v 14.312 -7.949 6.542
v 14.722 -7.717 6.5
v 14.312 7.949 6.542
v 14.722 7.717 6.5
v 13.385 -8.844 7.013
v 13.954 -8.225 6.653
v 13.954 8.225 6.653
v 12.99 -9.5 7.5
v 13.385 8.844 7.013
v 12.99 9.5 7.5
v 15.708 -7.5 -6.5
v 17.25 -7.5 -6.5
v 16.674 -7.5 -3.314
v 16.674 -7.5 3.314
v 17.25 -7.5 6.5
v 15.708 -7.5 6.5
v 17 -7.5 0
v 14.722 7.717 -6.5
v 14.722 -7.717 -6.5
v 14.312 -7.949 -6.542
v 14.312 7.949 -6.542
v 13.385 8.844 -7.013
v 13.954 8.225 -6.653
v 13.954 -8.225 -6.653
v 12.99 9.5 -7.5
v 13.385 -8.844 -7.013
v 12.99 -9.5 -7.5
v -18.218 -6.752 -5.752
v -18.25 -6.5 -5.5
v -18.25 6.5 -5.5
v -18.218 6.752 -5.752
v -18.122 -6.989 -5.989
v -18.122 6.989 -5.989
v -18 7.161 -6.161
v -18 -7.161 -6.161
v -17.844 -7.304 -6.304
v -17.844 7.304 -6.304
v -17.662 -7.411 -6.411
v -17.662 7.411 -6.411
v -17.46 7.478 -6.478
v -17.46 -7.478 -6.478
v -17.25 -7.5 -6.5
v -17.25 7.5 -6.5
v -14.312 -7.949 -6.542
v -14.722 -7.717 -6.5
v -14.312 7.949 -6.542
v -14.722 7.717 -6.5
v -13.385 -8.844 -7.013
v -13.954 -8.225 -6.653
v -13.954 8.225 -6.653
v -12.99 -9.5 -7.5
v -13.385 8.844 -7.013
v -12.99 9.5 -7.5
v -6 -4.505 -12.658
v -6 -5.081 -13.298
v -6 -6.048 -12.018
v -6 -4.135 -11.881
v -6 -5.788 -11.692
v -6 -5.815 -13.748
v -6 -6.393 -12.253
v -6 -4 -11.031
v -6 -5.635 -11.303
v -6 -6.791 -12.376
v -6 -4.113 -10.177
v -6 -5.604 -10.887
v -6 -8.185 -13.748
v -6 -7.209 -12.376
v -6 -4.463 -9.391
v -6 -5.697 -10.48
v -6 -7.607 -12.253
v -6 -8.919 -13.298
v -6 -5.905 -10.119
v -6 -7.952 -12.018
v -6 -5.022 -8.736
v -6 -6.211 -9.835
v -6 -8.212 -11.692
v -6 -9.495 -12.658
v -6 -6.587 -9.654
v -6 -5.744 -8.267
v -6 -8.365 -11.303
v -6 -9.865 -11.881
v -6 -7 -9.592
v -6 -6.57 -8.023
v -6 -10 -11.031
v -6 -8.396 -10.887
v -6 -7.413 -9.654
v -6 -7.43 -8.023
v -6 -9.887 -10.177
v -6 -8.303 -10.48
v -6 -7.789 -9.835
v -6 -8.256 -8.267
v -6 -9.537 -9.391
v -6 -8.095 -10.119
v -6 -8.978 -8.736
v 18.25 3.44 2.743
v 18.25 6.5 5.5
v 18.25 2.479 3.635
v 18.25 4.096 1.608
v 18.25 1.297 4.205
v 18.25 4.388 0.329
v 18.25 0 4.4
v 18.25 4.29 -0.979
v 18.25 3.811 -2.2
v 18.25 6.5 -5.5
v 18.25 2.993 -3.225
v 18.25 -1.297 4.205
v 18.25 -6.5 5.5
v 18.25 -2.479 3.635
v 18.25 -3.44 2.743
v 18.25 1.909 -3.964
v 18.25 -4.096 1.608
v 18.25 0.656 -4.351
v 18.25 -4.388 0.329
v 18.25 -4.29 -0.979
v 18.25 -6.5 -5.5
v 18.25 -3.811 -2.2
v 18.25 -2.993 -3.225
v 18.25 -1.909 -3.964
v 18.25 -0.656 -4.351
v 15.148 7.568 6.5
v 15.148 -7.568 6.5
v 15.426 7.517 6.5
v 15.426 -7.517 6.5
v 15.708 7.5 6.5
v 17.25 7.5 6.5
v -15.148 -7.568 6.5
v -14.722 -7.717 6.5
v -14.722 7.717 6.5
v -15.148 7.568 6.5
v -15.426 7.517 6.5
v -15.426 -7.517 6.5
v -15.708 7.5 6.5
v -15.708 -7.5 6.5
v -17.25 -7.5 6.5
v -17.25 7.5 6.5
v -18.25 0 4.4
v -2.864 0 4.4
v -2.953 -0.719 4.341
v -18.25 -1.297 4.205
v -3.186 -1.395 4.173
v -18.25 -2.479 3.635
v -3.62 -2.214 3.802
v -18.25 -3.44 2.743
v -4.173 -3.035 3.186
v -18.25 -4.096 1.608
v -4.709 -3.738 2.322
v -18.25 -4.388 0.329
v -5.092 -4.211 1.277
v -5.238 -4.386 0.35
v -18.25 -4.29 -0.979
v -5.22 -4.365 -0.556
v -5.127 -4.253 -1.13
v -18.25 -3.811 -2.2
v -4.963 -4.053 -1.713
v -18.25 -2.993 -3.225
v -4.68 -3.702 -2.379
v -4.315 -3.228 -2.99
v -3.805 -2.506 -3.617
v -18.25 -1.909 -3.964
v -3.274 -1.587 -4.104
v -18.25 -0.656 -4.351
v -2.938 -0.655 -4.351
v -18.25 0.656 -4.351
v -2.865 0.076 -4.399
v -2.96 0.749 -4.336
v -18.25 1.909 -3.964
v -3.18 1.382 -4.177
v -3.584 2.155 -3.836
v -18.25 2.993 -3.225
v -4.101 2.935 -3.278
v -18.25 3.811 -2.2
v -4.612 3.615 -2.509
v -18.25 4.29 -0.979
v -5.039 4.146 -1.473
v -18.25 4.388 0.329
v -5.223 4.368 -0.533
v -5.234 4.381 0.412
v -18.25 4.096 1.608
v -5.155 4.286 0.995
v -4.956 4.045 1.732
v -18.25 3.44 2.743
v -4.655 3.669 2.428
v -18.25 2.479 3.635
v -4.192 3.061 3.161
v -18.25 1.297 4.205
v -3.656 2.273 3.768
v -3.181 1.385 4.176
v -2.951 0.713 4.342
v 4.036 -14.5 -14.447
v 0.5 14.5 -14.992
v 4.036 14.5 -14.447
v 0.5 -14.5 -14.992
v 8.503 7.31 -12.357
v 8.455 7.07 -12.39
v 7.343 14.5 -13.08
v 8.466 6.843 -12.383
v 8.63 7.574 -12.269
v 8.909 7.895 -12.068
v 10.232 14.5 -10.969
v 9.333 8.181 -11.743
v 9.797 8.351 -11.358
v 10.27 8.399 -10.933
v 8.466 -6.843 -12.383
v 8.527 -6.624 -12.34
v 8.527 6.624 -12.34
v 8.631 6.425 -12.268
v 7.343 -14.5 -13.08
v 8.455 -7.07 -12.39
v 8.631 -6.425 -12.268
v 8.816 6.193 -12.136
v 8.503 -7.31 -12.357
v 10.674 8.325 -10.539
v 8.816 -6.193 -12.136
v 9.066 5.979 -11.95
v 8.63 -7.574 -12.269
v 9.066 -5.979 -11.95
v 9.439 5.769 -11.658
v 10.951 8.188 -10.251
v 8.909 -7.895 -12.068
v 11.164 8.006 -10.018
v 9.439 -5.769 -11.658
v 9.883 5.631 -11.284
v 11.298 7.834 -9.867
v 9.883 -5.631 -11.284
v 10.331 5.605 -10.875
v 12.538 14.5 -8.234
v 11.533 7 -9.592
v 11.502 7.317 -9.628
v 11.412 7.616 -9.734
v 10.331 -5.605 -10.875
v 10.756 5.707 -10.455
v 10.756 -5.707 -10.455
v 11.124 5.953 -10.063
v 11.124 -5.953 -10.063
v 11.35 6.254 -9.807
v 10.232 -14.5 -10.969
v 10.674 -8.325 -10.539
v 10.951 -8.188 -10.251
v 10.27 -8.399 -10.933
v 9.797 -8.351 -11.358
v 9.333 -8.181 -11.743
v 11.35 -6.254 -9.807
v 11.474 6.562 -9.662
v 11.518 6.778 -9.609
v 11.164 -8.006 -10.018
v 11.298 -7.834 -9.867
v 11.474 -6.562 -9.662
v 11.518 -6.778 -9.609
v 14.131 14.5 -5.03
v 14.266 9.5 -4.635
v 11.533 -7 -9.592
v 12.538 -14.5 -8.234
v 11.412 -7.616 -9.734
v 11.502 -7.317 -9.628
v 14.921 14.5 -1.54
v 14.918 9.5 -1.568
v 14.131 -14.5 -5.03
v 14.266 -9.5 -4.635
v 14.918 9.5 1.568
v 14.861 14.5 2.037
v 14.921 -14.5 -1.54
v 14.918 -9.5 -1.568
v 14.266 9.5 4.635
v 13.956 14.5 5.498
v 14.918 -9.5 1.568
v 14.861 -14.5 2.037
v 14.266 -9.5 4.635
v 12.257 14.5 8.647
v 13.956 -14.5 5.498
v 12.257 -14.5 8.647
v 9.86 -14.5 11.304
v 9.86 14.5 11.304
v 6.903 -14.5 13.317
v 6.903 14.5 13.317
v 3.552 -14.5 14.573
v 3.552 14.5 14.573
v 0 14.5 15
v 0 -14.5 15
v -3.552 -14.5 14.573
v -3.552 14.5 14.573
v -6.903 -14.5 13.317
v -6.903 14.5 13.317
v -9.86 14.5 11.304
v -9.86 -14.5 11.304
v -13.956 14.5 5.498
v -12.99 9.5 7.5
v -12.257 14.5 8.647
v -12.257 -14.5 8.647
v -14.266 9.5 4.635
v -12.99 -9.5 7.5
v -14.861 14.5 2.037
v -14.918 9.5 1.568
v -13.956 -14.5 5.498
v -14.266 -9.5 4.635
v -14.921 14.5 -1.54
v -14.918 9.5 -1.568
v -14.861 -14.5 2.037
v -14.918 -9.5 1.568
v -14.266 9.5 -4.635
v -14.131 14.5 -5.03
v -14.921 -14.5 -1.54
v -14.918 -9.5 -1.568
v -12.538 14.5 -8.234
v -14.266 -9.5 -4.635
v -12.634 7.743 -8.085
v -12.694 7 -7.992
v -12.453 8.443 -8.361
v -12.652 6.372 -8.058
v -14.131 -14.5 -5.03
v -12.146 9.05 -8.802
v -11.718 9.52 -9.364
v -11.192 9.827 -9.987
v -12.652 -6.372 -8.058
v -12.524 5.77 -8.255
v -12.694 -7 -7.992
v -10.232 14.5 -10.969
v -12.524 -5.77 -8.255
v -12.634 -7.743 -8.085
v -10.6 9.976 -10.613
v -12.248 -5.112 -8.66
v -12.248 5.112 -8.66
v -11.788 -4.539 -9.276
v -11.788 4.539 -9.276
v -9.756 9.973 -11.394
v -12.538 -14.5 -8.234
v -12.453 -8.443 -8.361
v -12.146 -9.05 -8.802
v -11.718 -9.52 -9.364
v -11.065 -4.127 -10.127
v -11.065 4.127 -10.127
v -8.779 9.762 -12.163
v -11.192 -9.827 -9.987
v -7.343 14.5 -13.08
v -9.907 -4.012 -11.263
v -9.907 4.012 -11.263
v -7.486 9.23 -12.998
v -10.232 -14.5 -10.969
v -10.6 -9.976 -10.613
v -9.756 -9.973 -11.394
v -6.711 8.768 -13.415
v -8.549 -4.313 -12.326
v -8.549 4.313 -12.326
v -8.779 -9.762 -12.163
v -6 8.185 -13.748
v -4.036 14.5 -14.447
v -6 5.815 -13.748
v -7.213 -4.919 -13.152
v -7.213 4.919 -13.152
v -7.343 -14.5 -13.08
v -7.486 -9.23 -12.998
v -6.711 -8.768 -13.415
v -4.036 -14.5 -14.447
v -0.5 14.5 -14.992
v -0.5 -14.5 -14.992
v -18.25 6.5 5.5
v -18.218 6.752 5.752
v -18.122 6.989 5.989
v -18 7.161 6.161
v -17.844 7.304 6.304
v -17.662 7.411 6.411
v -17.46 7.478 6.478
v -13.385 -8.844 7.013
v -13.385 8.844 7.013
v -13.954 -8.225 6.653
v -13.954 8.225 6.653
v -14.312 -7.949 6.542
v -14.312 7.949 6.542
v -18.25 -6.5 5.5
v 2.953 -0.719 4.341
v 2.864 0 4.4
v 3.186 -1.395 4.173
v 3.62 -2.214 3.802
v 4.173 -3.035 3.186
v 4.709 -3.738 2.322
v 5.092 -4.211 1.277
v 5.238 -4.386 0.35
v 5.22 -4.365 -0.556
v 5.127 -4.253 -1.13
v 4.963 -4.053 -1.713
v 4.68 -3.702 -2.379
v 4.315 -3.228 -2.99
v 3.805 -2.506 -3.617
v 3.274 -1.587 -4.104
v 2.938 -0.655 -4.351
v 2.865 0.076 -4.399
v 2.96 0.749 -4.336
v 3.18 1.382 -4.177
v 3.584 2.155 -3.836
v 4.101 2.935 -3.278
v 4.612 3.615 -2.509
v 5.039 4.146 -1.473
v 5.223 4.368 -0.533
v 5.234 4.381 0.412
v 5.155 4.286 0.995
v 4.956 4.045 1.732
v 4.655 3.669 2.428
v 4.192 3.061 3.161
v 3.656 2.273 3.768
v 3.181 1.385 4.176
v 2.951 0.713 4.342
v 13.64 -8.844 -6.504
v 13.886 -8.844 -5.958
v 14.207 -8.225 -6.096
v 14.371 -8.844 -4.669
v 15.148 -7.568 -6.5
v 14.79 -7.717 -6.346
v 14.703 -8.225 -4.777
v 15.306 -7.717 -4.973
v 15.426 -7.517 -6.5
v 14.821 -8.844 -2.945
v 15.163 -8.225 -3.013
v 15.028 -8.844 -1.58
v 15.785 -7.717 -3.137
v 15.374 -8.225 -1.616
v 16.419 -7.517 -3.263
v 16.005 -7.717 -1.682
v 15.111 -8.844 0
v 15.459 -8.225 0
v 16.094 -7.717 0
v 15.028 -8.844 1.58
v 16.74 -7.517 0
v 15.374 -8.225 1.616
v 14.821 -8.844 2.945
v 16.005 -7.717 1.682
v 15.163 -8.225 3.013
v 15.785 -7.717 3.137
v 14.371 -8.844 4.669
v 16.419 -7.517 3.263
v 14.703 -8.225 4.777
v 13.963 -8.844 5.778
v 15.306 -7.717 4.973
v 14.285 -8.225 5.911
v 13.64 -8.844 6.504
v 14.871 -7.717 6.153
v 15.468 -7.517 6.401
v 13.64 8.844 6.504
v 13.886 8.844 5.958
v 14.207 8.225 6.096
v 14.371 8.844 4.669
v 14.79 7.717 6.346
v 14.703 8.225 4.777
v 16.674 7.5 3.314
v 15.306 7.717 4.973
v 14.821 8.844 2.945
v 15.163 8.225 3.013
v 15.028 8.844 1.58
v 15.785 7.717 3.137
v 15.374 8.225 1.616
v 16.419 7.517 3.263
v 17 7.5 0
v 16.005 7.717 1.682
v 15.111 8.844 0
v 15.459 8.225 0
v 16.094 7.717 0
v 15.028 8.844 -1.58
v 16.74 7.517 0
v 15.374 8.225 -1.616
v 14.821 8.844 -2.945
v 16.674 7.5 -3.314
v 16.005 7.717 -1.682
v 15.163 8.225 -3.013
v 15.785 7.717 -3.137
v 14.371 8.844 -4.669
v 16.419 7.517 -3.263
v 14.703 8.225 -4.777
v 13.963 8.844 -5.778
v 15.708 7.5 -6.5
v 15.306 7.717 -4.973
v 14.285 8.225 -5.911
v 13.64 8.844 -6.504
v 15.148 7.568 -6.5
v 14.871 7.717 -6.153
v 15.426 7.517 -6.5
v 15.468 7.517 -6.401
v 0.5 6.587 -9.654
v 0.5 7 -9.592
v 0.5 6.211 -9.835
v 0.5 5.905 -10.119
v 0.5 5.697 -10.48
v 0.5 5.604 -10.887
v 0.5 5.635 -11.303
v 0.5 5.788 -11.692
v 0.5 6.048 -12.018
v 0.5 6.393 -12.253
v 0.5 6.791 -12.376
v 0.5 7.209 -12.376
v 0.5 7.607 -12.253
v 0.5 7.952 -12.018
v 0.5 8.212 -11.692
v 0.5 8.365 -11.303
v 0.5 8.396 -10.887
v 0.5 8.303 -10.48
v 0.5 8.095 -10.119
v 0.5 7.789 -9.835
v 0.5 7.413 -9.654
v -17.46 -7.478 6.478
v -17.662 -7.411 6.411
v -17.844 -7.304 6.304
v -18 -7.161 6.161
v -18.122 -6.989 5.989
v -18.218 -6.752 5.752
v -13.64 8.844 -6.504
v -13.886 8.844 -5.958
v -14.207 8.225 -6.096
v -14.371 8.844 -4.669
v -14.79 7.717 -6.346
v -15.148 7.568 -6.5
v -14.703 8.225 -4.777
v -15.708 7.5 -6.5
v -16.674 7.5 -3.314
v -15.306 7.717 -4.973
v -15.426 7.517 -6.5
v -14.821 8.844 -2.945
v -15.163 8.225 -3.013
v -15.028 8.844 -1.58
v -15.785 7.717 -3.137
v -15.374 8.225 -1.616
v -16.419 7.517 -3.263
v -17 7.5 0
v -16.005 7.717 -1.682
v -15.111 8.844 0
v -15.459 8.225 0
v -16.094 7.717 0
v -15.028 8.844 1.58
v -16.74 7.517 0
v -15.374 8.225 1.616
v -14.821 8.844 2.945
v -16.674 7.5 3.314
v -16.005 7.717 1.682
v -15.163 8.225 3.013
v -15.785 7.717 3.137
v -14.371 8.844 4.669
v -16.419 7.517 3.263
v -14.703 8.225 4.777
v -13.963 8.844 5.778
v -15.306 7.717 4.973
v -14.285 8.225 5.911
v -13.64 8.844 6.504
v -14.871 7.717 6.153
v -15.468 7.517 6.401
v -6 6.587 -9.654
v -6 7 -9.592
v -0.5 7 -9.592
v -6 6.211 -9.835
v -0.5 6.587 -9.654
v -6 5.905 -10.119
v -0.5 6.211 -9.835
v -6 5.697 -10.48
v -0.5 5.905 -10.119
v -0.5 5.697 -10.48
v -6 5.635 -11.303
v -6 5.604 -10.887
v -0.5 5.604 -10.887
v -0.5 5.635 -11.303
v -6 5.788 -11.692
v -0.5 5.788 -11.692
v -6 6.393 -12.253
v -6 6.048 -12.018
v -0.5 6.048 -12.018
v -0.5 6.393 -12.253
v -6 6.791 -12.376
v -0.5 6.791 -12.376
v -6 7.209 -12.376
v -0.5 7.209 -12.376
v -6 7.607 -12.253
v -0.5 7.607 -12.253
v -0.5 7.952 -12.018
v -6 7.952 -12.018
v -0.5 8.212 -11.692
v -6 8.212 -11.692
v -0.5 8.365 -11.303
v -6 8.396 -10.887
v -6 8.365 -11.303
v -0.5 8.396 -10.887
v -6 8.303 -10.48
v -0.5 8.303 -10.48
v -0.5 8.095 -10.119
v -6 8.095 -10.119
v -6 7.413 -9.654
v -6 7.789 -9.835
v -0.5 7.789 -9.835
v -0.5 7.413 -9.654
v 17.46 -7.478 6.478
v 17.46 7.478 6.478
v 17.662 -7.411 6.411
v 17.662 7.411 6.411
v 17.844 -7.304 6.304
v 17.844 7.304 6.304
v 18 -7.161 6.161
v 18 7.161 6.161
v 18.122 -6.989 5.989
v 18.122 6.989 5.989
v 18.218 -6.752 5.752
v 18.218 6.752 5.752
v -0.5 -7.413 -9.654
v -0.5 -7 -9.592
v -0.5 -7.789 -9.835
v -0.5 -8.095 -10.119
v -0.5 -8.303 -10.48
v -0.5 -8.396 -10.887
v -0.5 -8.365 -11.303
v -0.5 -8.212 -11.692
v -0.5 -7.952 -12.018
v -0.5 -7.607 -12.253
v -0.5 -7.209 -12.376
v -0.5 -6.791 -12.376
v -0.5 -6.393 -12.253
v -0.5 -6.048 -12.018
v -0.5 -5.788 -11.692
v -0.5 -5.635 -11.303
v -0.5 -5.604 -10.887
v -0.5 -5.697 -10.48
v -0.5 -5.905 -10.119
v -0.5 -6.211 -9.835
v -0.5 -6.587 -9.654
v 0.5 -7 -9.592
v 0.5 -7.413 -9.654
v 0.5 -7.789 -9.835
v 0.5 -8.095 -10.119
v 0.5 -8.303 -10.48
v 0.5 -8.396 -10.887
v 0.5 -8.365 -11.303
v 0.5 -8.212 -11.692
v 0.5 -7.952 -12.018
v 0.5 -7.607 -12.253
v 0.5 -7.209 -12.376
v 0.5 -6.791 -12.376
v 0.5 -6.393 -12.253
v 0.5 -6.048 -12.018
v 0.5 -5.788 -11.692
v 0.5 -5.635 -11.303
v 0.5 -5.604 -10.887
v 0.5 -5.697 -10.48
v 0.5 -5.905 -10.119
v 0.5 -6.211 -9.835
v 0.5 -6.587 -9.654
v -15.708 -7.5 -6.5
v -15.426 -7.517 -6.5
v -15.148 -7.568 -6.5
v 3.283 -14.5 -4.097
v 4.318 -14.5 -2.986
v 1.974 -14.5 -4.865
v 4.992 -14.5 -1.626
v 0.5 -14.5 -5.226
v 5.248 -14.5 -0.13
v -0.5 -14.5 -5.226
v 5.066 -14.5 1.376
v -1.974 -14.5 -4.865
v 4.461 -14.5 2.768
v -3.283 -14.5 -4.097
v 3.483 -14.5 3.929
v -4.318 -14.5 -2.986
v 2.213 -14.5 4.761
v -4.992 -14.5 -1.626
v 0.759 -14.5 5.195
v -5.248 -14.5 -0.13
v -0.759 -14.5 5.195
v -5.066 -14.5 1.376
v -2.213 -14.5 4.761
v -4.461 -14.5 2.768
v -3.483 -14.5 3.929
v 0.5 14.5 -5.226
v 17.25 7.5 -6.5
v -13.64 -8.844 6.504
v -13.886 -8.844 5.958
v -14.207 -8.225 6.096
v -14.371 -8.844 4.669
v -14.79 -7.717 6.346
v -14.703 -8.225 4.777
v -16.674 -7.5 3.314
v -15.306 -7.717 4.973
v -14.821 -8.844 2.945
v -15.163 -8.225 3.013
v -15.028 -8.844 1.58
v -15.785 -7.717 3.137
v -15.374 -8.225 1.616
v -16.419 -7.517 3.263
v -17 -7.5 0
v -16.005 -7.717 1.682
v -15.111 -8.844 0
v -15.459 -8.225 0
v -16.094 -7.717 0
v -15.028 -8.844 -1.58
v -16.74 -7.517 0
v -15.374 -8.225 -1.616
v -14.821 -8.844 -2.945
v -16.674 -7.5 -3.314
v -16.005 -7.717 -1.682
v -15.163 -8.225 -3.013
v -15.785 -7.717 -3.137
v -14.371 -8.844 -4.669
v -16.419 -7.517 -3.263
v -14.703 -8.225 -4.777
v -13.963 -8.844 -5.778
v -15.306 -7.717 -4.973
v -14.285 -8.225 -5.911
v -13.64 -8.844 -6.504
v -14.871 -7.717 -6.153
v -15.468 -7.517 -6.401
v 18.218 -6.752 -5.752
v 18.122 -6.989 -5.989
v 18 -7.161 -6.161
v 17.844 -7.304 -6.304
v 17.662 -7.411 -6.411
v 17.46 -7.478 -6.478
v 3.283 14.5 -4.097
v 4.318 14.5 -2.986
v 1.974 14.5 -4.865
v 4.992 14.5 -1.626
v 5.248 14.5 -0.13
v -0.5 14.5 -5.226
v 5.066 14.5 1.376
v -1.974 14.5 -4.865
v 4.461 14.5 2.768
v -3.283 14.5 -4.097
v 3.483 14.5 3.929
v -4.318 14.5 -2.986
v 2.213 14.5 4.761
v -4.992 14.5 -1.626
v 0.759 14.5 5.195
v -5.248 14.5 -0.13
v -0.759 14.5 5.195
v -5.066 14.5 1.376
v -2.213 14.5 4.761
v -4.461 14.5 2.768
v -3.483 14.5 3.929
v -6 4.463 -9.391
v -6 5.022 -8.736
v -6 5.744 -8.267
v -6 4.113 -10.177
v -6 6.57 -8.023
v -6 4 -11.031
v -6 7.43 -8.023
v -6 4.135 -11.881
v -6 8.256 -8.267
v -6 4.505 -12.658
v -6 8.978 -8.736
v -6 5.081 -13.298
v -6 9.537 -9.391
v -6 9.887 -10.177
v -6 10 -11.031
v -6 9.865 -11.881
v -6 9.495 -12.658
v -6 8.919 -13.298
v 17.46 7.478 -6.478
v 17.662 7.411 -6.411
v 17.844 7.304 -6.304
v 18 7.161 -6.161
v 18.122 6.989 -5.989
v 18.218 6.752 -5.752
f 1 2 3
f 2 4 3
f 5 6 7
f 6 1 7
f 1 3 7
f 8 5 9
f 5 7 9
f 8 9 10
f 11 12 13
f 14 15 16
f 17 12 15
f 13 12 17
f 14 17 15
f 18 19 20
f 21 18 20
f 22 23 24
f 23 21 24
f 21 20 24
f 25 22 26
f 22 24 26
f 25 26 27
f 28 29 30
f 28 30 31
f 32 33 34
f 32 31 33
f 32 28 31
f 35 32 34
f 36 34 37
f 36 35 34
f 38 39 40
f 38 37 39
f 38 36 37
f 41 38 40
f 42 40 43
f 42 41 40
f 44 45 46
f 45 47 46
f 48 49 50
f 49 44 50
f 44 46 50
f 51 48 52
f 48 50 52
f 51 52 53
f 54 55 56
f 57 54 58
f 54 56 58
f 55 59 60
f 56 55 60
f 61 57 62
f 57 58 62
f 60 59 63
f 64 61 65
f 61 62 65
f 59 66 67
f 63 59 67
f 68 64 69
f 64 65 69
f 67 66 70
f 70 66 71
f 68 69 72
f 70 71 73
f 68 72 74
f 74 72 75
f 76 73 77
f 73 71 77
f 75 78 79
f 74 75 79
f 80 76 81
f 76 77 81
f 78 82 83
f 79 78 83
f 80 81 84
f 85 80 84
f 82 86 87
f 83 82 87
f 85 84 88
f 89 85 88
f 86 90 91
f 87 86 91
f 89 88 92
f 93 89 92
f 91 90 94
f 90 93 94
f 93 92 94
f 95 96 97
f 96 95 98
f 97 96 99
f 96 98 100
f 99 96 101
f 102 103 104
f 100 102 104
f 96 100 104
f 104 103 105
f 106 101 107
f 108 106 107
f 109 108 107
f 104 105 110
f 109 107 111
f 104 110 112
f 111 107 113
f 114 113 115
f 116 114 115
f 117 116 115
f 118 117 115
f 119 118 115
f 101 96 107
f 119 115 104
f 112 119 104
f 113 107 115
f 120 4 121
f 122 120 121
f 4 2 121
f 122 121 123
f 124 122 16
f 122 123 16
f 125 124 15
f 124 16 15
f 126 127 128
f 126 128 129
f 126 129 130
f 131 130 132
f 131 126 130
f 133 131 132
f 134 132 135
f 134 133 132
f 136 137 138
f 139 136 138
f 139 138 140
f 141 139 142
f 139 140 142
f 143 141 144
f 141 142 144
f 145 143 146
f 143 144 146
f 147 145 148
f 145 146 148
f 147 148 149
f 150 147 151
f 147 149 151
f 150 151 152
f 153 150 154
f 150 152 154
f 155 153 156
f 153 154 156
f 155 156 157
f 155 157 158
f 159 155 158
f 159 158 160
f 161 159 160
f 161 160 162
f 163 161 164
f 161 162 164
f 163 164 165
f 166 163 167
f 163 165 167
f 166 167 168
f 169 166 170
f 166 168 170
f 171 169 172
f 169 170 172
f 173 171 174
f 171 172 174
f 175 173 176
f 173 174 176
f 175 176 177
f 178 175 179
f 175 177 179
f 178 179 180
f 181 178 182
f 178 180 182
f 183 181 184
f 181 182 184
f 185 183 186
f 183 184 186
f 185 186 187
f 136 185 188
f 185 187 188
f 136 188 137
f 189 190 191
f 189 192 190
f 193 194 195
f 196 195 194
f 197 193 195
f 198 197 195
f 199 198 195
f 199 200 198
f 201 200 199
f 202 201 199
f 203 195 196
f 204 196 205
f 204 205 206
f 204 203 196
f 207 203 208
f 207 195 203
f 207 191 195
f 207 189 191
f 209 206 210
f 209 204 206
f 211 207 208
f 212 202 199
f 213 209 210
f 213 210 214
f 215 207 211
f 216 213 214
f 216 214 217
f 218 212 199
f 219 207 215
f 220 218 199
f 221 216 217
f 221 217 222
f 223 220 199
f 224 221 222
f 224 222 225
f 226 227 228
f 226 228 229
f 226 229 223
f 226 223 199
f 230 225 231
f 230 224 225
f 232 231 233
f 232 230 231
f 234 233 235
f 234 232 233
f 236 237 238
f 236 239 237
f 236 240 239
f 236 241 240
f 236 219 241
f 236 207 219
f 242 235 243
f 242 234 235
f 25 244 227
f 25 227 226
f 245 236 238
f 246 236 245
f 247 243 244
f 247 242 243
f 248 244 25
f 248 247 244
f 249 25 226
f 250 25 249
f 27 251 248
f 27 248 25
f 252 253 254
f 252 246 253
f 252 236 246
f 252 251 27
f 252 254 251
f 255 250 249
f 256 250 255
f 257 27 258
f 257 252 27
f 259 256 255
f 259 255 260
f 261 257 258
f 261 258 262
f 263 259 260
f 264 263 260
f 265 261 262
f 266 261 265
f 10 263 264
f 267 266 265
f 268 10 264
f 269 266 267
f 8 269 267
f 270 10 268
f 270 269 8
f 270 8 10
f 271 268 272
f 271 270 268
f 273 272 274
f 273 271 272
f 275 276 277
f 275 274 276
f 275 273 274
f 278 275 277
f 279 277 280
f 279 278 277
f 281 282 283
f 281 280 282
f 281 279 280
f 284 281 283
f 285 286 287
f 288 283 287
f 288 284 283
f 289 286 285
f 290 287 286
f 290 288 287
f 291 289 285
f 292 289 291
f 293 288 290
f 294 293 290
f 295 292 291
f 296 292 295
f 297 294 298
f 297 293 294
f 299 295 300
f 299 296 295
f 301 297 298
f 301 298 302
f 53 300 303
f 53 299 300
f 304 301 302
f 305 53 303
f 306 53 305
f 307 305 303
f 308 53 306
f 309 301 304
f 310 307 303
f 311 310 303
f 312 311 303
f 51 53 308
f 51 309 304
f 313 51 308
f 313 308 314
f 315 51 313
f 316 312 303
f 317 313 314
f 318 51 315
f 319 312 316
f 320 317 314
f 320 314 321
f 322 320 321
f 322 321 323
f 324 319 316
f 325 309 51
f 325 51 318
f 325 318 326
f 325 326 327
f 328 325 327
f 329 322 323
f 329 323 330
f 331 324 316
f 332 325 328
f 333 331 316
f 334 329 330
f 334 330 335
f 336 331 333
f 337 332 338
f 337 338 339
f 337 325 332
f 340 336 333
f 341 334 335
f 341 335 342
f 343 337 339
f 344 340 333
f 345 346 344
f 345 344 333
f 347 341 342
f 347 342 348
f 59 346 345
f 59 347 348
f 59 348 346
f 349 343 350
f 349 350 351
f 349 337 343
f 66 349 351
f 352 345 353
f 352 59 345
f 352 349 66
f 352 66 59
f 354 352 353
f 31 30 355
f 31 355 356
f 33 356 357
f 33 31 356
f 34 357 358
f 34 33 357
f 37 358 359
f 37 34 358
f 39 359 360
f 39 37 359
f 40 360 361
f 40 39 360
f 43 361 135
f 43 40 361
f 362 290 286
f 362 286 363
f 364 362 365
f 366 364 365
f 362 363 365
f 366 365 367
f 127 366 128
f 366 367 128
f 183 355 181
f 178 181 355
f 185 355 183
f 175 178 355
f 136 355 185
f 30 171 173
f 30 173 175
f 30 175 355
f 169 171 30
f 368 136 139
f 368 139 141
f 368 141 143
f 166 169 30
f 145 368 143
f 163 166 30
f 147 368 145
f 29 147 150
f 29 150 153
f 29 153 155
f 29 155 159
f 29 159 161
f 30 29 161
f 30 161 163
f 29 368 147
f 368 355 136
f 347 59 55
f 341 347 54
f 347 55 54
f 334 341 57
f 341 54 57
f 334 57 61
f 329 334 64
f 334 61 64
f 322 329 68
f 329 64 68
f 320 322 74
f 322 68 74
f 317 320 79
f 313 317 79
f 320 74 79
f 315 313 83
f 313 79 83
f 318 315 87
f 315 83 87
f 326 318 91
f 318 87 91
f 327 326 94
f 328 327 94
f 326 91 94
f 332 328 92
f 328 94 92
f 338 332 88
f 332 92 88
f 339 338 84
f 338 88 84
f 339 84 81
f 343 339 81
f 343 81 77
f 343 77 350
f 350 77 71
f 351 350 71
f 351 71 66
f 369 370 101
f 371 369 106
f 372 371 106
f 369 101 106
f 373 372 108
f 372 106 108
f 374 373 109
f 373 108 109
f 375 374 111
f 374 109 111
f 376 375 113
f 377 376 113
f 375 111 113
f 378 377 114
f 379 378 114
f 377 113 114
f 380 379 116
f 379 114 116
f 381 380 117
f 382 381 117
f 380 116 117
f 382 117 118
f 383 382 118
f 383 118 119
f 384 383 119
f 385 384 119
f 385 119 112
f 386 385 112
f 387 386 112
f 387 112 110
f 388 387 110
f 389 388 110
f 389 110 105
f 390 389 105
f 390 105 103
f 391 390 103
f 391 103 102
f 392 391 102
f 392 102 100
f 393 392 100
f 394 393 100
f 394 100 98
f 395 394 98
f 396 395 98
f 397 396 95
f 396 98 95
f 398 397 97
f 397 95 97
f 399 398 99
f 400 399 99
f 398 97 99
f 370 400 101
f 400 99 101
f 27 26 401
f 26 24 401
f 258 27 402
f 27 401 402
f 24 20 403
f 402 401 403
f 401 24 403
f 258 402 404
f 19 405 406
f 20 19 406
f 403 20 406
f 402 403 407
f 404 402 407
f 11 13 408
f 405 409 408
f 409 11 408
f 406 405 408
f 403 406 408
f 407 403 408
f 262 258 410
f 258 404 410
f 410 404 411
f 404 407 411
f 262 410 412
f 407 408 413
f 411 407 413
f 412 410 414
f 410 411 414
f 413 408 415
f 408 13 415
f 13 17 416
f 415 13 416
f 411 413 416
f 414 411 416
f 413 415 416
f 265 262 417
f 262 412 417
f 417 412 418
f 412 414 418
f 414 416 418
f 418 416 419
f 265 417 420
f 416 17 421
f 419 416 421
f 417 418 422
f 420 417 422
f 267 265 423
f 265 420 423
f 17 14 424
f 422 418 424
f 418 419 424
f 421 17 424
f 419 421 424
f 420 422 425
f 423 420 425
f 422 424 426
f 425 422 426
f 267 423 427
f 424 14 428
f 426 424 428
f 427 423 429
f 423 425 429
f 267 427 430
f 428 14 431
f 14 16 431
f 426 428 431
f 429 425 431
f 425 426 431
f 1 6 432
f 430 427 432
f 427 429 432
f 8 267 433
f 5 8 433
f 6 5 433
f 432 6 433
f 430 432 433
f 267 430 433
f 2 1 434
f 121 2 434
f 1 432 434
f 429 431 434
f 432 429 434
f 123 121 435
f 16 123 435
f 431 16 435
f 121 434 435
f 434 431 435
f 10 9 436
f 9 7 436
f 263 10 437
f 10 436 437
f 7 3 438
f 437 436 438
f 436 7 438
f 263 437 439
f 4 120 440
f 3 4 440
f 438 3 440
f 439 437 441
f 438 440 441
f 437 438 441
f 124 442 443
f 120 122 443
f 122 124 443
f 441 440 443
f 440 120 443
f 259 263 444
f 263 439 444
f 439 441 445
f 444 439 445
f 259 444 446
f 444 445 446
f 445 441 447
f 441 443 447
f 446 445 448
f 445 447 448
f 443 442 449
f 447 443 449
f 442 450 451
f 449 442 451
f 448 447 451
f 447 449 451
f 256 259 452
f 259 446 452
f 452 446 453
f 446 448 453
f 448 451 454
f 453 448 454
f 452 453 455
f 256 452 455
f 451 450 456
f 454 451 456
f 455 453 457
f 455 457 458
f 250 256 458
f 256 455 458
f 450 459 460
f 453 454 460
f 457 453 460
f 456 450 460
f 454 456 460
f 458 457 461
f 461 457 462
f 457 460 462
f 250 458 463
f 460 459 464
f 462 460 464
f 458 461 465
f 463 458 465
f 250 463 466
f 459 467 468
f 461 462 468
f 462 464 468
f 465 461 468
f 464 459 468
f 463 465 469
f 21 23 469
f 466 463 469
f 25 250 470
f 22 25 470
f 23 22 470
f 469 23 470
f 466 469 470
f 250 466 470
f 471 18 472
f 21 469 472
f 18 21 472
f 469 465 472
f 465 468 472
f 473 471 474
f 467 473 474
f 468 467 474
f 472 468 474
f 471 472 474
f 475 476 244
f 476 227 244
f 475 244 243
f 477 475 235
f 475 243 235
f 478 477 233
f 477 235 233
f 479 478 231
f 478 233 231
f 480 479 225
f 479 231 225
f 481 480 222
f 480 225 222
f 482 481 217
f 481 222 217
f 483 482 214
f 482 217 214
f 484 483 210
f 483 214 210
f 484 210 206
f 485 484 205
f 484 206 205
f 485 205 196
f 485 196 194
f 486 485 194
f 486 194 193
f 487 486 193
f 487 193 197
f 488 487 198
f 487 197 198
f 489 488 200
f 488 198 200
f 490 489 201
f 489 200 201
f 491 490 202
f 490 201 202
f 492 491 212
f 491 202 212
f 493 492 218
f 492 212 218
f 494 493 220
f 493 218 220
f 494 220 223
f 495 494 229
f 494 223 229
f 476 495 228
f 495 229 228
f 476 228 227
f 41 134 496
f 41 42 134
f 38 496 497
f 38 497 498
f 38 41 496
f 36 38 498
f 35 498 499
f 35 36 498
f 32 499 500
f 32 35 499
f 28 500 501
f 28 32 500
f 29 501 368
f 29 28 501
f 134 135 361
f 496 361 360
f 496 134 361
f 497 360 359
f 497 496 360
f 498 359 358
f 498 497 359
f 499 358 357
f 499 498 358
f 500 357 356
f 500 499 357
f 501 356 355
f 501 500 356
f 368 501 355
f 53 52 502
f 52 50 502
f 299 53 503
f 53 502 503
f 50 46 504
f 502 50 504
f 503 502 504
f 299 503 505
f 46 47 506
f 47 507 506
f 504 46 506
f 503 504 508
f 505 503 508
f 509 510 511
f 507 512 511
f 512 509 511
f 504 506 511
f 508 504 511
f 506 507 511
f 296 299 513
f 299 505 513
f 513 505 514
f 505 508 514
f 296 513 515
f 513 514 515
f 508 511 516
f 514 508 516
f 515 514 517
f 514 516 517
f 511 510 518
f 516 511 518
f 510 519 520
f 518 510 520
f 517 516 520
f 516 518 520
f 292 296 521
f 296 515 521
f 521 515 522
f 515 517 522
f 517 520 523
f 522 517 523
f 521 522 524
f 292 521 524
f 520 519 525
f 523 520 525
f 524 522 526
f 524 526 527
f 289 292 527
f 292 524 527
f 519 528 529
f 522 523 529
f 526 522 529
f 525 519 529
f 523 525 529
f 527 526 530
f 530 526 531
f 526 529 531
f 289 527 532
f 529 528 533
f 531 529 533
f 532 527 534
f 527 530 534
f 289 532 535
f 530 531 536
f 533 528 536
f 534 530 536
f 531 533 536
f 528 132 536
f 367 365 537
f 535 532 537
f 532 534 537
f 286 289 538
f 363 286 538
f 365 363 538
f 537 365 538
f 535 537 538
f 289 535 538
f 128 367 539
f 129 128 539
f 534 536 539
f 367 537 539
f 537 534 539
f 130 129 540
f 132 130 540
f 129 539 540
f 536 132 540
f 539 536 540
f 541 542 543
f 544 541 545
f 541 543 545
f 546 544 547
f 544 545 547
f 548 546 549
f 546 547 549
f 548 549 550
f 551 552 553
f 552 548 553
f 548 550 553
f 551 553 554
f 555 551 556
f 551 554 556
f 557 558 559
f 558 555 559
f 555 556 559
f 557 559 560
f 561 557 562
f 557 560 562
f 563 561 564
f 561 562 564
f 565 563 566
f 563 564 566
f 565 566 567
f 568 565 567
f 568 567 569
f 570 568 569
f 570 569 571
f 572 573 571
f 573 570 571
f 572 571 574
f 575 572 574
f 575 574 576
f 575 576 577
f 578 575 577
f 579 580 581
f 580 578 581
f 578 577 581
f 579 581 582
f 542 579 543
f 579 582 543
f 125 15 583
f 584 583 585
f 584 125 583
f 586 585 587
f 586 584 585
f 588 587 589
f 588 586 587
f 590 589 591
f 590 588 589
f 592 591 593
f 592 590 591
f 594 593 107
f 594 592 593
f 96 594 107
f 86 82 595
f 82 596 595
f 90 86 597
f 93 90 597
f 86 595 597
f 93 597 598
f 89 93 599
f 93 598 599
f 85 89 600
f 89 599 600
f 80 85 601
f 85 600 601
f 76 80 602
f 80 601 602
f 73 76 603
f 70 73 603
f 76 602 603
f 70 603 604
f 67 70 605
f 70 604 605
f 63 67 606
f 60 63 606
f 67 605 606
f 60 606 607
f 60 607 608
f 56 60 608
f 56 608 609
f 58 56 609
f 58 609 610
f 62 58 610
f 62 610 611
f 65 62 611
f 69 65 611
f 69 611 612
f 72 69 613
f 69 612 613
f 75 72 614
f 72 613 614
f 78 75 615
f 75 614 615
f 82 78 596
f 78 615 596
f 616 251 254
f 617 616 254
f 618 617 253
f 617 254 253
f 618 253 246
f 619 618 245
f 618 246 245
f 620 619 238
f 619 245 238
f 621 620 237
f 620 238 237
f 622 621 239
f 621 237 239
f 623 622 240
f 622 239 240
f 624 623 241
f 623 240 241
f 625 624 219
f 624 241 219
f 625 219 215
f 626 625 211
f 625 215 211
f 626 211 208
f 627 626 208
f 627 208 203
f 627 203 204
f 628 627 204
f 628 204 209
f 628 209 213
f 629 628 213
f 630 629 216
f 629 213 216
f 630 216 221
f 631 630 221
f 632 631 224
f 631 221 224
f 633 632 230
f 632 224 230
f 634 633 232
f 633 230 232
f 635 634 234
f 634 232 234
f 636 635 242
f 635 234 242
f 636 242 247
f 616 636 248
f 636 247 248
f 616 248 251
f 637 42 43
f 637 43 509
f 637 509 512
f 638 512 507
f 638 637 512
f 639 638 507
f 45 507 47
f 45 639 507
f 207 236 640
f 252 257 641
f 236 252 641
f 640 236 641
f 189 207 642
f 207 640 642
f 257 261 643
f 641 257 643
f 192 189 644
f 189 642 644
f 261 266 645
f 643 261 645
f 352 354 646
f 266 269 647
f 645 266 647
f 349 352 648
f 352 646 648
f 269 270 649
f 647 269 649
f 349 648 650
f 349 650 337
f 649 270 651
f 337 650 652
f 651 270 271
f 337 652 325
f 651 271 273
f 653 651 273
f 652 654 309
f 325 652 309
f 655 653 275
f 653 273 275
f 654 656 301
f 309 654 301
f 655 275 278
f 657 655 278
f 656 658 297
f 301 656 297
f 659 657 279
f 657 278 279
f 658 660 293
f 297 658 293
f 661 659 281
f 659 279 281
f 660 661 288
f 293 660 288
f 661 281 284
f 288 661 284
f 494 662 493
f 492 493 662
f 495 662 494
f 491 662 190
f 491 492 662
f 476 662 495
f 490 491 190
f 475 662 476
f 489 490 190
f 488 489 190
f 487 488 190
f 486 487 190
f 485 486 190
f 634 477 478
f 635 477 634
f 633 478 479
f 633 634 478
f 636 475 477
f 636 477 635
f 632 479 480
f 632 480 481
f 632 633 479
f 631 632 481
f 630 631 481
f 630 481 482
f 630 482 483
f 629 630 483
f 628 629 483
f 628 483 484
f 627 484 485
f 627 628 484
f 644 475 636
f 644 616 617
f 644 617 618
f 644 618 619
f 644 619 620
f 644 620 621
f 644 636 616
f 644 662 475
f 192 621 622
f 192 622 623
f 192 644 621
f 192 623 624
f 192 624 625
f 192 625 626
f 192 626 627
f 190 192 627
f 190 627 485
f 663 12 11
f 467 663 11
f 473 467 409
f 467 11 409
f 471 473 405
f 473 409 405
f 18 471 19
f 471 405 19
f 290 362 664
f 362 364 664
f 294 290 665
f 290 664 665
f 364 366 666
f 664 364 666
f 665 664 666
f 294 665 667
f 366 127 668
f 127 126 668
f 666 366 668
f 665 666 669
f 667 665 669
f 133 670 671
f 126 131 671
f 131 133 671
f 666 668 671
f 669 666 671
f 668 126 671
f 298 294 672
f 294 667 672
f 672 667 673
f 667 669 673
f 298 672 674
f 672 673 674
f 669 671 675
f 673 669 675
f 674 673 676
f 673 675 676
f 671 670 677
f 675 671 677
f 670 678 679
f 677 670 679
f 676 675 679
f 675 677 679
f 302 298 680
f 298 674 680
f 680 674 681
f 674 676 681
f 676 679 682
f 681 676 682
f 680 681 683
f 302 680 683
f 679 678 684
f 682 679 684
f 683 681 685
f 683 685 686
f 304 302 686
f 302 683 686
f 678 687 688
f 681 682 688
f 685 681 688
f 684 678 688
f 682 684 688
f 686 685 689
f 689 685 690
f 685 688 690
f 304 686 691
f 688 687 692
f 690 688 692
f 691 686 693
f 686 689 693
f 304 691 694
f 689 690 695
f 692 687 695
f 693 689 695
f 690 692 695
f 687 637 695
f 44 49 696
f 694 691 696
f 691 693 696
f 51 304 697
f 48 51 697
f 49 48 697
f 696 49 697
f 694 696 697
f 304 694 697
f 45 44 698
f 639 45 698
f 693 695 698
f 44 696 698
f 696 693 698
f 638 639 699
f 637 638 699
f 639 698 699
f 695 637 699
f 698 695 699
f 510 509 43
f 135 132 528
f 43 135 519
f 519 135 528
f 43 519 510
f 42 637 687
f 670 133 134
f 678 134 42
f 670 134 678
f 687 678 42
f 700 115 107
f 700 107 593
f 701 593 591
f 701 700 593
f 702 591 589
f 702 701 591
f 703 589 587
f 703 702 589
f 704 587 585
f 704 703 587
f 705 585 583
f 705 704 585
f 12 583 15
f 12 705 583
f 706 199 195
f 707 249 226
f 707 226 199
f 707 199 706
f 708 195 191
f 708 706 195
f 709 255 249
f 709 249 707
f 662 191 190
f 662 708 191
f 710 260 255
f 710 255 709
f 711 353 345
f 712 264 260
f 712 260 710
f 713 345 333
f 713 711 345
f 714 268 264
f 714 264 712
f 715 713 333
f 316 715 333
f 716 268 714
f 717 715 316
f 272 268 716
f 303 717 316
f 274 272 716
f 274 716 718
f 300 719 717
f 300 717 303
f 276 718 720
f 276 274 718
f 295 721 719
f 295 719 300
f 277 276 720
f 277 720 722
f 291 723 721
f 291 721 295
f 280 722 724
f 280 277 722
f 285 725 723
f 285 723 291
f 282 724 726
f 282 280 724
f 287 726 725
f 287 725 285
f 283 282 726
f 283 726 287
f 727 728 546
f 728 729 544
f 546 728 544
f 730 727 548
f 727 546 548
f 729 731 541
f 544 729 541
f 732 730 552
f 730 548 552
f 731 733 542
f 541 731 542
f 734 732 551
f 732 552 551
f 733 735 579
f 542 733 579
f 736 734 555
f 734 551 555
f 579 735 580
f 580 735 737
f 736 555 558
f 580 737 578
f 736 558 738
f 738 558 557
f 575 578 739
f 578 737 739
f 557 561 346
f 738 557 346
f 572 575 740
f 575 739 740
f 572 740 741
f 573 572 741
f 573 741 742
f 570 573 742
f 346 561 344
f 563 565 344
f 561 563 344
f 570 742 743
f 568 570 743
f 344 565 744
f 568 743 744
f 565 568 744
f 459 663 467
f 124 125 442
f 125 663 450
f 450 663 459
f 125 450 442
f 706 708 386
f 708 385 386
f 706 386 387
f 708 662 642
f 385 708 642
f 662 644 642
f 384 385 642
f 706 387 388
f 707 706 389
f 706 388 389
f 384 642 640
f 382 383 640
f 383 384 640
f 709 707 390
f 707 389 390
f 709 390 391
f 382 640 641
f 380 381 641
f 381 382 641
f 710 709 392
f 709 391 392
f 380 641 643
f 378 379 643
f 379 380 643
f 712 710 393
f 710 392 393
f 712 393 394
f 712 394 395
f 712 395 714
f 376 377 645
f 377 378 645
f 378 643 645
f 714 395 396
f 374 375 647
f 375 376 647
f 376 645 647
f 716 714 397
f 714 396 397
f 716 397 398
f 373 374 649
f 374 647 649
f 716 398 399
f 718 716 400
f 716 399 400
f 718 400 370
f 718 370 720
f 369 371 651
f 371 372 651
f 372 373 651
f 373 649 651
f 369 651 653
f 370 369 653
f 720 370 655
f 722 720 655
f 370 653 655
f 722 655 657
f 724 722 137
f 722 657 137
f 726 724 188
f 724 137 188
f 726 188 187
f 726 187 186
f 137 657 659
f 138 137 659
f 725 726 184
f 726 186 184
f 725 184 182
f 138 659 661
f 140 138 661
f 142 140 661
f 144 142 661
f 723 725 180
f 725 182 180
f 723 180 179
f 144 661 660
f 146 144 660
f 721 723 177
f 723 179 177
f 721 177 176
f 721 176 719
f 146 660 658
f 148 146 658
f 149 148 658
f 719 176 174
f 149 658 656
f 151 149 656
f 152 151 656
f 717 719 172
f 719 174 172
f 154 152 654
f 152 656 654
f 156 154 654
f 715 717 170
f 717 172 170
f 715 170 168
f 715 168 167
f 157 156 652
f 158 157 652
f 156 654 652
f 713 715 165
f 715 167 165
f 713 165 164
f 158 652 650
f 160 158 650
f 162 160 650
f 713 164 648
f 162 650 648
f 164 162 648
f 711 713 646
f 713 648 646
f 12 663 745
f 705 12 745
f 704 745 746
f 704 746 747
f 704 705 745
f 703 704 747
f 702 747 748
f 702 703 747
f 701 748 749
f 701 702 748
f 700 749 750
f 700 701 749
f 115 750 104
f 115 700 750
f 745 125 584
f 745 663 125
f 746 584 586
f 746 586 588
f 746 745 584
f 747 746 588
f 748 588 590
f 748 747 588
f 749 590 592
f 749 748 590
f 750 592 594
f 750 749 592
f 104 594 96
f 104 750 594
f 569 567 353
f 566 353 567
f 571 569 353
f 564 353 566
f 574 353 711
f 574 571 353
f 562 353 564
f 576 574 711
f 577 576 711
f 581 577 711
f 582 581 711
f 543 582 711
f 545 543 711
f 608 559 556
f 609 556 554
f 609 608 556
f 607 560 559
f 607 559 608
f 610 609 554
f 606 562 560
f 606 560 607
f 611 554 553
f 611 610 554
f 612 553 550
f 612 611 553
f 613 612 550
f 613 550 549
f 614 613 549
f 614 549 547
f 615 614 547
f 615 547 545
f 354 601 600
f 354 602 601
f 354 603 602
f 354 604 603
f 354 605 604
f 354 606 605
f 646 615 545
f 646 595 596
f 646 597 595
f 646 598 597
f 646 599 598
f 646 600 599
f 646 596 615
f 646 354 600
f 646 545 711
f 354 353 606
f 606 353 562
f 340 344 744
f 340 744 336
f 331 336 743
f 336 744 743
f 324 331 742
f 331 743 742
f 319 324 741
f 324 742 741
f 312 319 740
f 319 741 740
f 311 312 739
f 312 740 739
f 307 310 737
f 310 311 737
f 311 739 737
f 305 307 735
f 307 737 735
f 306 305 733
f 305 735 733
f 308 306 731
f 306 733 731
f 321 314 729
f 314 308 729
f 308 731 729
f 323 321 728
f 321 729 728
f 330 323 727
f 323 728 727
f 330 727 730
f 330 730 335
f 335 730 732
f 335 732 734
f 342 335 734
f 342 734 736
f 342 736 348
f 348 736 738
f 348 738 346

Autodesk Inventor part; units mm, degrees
ref_plane "YZ Plane" through (0, 0, 0) normal (1, 0, 0) x (0, 1, 0)
ref_plane "XZ Plane" through (0, 0, 0) normal (0, 1, 0) x (-1, 0, 0)
sketch "Sketch1" plane through (0, 0, 0) normal (0, 1, 0) x (-1, 0, 0)
  arc A0 (0.5, -14.9917) -> (-0.5, -14.9917) centre (0, 0) ccw
  arc A1 (0.5, -5.2261) -> (-0.5, -5.2261) centre (0, 0) ccw
  line L0 (-0.5, -5.2261) -> (-0.5, -14.9917)
  line L1 (0.5, -14.9917) -> (0.5, -5.2261)
  line L2 (0, 0) -> (0, -14.3069)
  dimension "d0" = 30
  dimension "d1" = 10.5
  dimension "d2" = 1
extrude "Extrusion1" add sketch "Sketch1" along normal mid plane 29
ref_plane "Work Plane2" through (-15, 0, 0) normal (1, 0, 0) x (0, 0, -1)
sketch "Sketch3" plane through (-15, 0, 0) normal (1, 0, 0) x (0, 0, -1)
  line L0 (14.9917, -14.5) -> (5.2261, -14.5) projected
  line L1 (14.9917, 14.5) -> (14.9917, -14.5) projected
  point P0 (0, 0)
  point P1 (10.9917, -7)
  dimension "d6" = 7.5
  dimension "d7" = 4
hole "Hole1" at (-15, -7, -10.9917) direction (1, 0, 0) diameter 2.8 end through all counterbore diameter 6 counterbore depth 9
mirror "Mirror1" about plane through (0, 0, 0) normal (0, 1, 0) of "Hole1"
sketch "Sketch5" plane through (0, 0, 0) normal (0, 1, 0) x (-1, 0, 0)
  arc A0 (0.5, -14.9917) -> (-0.5, -14.9917) centre (0, 0) ccw projected
  line L0 (13.5185, 6.5) -> (18.25, 6.5)
  line L1 (18.25, 6.5) -> (18.25, -6.5)
  line L2 (18.25, -6.5) -> (13.5185, -6.5)
  line L3 (0, 0) -> (15.3886, 0)
  line L4 (0, 0) -> (0, -14.2024)
  arc A1 (13.5185, -6.5) -> (13.5185, 6.5) centre (0, 0) ccw
  line L5 (-13.5185, 6.5) -> (-18.25, 6.5)
  line L6 (-18.25, 6.5) -> (-18.25, -6.5)
  line L7 (-18.25, -6.5) -> (-13.5185, -6.5)
  arc A2 (-13.5185, 6.5) -> (-13.5185, -6.5) centre (0, 0) ccw
  arc A3 (0.5, -5.2261) -> (-0.5, -5.2261) centre (0, 0) ccw construction
  line L8 (5.25, 0) -> (5.25, -22.9648) construction
  point P0 (-15.3886, 0)
  dimension "d23" = 13
  dimension "d36" = 13
extrude "Extrusion2" add sketch "Sketch5" along normal mid plane 15
sketch "Sketch6" plane through (-18.25, -7.5, 6.5) normal (-1, 0, 0) x (0, 0, 1)
  point P0 (-6.5, 7.5)
  point P1 (-6.5, 7.5)
hole "Hole3" at (-18.25, 0, 0) direction (1, 0, 0) diameter 8.8 end through all
fillet "Fillet1" radius 2 8 edges at (-13.5185, 0, -6.5) (-15, 7.5, 0) (-13.5185, 0, 6.5) (-15, -7.5, 0) (13.5185, 0, 6.5) (15, -7.5, 0) (13.5185, 0, -6.5) (15, 7.5, 0)
fillet "Fillet2" radius 1 8 edges at (18.25, 0, 6.5) (18.25, 7.5, 0) (18.25, 0, -6.5) (18.25, -7.5, 0) (-18.25, 0, 6.5) (-18.25, 7.5, 0) (-18.25, 0, -6.5) (-18.25, -7.5, 0)
properties part number "Space" material "ABS Plastic"
